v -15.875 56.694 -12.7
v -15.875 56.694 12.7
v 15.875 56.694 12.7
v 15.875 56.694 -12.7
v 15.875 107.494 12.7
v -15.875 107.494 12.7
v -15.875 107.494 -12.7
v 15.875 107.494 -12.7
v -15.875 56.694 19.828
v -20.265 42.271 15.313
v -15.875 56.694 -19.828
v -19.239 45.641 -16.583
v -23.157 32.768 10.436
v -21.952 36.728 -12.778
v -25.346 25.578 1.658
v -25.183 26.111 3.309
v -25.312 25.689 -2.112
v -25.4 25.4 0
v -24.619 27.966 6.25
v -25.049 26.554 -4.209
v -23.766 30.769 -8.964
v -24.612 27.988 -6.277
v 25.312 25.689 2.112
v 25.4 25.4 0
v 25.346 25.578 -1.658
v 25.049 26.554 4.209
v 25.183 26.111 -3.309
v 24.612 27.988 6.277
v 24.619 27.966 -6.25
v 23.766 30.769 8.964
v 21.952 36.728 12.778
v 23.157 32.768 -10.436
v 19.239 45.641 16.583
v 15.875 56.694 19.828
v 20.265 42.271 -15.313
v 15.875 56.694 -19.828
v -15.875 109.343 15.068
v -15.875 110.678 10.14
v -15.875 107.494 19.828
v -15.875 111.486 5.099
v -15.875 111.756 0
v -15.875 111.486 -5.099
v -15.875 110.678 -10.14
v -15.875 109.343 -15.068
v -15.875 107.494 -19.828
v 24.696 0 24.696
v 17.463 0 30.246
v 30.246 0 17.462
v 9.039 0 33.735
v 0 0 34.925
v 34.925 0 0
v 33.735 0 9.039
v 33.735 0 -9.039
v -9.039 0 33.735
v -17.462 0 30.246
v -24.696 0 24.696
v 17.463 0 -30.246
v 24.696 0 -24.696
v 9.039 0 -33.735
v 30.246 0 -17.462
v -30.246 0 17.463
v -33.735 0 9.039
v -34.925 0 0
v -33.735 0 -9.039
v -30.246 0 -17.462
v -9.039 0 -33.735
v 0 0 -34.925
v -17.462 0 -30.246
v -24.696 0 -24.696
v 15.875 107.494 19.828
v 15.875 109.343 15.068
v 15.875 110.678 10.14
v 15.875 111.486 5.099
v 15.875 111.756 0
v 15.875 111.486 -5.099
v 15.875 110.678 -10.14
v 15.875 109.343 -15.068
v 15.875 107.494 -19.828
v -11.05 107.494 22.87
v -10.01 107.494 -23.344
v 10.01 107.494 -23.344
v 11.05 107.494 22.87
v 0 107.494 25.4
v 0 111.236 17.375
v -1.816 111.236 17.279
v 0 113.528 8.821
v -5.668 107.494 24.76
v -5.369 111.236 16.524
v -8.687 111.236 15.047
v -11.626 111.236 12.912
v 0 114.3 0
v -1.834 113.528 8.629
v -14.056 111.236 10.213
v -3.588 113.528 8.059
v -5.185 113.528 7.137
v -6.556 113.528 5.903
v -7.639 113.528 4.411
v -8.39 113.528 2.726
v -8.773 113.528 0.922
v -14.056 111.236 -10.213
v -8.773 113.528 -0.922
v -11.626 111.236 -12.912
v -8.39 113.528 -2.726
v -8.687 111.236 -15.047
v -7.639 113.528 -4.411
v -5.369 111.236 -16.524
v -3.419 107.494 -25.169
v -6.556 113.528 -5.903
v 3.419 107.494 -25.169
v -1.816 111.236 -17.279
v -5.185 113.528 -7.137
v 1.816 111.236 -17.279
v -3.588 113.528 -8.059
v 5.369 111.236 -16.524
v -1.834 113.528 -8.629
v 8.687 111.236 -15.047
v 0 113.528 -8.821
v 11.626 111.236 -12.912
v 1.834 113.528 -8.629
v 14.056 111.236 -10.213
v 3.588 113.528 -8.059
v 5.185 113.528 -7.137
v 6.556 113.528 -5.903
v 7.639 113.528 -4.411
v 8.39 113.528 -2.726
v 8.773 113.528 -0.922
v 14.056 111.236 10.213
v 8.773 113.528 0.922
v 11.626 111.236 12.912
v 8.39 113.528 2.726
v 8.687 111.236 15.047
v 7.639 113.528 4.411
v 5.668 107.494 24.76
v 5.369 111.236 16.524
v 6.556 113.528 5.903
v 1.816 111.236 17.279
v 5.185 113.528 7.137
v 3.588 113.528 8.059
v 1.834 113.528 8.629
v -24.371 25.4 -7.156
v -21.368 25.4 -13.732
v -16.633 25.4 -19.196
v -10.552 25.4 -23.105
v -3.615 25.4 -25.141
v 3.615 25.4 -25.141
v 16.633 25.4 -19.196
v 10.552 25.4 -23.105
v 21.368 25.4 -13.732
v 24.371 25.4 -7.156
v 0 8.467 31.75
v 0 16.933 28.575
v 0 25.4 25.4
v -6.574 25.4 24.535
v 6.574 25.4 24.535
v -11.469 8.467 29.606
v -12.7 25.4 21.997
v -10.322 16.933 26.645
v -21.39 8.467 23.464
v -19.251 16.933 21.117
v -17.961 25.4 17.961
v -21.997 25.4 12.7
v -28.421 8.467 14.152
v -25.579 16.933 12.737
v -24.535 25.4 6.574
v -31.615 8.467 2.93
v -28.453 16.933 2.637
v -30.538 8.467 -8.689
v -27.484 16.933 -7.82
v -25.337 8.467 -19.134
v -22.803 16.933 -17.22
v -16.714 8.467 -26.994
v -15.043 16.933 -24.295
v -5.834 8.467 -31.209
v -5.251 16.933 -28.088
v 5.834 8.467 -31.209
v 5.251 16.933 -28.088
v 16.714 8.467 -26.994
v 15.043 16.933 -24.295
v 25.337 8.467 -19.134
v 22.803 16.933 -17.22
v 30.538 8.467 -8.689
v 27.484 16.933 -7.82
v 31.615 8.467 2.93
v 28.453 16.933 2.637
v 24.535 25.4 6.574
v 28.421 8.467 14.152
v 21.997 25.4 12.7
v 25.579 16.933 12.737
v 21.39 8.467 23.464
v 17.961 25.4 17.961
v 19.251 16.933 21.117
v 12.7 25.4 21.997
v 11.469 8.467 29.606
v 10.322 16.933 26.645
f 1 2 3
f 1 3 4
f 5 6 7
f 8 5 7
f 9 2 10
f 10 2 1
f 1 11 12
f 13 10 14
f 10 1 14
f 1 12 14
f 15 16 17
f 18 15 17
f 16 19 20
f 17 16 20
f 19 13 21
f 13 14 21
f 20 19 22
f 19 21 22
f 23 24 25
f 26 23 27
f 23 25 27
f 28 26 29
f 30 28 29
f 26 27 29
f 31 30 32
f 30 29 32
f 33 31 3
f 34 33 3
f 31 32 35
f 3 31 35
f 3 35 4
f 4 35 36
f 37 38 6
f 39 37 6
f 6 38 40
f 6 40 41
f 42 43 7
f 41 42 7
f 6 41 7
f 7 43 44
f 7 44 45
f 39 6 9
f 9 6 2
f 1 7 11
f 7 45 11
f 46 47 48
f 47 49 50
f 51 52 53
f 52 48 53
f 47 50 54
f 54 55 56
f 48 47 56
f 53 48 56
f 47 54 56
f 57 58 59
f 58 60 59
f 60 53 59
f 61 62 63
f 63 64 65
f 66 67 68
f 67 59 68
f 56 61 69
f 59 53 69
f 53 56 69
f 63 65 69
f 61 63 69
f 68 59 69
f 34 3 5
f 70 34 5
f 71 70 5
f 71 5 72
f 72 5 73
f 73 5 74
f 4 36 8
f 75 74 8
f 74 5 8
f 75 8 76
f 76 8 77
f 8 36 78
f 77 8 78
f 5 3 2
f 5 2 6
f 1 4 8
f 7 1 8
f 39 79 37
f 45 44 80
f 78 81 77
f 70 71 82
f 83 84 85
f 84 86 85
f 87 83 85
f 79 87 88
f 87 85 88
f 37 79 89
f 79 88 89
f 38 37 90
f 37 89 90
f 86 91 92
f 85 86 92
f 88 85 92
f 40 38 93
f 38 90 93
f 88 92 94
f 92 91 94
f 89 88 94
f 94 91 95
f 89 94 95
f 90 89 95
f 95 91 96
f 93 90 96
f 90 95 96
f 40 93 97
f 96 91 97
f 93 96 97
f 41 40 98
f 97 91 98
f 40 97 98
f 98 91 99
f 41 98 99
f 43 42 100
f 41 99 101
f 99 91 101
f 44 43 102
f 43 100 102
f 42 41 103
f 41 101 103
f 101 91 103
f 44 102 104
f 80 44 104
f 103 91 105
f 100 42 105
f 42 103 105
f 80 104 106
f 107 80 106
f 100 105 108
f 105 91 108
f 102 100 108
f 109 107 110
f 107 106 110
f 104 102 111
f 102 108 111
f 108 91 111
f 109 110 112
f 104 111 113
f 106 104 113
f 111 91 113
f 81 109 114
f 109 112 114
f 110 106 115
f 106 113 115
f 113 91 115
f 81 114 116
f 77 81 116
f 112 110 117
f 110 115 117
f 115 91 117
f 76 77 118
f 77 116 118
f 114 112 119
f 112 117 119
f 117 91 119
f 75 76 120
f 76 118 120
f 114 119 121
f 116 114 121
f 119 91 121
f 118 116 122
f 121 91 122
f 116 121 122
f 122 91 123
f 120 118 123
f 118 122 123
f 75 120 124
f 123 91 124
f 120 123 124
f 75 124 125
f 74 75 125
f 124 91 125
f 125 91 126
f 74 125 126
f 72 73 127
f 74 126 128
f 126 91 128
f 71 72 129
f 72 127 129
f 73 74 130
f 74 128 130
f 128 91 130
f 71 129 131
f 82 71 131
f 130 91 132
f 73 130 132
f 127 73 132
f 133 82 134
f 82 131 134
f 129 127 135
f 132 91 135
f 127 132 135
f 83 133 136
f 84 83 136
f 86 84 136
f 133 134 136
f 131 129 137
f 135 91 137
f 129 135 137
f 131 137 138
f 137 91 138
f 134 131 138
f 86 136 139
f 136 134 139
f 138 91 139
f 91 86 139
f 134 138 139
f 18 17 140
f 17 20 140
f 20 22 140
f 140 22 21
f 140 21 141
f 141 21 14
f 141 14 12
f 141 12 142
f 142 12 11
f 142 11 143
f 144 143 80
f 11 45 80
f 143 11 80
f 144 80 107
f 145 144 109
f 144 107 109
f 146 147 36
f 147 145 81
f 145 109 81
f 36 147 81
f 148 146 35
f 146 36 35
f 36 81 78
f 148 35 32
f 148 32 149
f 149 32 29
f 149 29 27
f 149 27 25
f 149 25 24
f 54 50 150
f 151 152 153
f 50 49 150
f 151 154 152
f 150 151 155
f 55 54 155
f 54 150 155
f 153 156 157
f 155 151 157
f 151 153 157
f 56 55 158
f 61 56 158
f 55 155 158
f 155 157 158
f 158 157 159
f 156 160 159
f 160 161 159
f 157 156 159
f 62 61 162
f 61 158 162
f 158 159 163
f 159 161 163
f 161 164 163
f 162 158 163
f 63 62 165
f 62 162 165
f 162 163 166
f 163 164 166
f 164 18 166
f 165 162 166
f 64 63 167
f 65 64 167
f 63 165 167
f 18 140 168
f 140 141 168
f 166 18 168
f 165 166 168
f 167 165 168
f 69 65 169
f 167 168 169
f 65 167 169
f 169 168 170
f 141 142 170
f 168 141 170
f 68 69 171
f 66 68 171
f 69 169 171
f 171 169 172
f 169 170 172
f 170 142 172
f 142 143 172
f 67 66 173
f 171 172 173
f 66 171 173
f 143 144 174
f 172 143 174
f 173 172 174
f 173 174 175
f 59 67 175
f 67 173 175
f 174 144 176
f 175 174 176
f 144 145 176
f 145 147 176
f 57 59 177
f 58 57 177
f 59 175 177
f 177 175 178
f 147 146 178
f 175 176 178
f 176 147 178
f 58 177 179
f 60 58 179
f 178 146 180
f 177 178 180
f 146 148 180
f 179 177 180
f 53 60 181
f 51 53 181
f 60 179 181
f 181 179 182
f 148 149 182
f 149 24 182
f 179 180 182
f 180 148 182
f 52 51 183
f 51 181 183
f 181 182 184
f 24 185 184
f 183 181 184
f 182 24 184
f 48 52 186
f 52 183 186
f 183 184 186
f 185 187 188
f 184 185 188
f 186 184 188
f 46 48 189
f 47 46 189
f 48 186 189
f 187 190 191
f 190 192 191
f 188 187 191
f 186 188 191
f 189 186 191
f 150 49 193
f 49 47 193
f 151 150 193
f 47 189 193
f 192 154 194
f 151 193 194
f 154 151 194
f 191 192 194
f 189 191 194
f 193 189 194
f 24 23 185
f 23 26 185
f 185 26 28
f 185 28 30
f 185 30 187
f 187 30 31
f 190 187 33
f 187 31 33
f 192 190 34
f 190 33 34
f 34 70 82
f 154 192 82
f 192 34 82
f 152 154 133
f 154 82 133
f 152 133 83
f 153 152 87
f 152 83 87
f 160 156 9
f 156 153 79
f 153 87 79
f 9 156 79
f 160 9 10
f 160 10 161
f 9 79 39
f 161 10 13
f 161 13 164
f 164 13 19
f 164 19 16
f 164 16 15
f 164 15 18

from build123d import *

# Parameters (mm, degrees)
CUT_EXTRUDE2_DEPTH      = 125.51506435
CUT_EXTRUDE2_DEPTH_BACK = 125.51506435
SKETCH7_W               = 25.4
SKETCH7_H               = 50.8
CUT_EXTRUDE3_DEPTH      = 254


with BuildPart() as part:
    # Sketch1 → Revolve1 (revolve)
    with BuildSketch(Plane.XY, mode=Mode.PRIVATE) as revolve1_sk:
        with BuildLine():
            Line((0, 0), (34.925, 0))
            Line((34.925, 0), (25.4, 25.4))
            Line((25.4, 25.4), (25.4, 107.494090512))
            ThreePointArc((25.4, 107.494090512), (13.148007491, 112.569031975), (0, 114.3))
            Line((0, 114.3), (0, 0))
        make_face()
    revolve(revolve1_sk.sketch.rotate(Axis((0, 114.3, 0), (0, -1, 0)), 90), axis=Axis((0, 114.3, 0), (0, -1, 0)))

    # Sketch6 → Cut-Extrude2 (cut, two sides: drawn at the far end of the back side and taken through both)
    with BuildSketch(Plane.XY.offset(-CUT_EXTRUDE2_DEPTH_BACK)):
        Polygon((-15.875, 56.694090512), (-25.4, 25.4), (-28.70874161, 28.70874161), (-29.778723272, 127.895690519), (-15.875, 127.895690519), align=None)
        Polygon((15.875, 127.895690519), (29.778723272, 127.895690519), (28.70874161, 28.70874161), (25.4, 25.4), (15.875, 56.694090512), align=None)
    extrude(amount=CUT_EXTRUDE2_DEPTH + CUT_EXTRUDE2_DEPTH_BACK, mode=Mode.SUBTRACT)

    # Sketch7 → Cut-Extrude3 (cut)
    with BuildSketch(Plane(origin=(15.875, 0, 0), x_dir=(0, 0, -1), z_dir=(1, 0, 0))):
        with Locations((0, 82.094090512)):
            Rectangle(SKETCH7_W, SKETCH7_H)
    extrude(amount=-CUT_EXTRUDE3_DEPTH, mode=Mode.SUBTRACT)


solid = part.part
